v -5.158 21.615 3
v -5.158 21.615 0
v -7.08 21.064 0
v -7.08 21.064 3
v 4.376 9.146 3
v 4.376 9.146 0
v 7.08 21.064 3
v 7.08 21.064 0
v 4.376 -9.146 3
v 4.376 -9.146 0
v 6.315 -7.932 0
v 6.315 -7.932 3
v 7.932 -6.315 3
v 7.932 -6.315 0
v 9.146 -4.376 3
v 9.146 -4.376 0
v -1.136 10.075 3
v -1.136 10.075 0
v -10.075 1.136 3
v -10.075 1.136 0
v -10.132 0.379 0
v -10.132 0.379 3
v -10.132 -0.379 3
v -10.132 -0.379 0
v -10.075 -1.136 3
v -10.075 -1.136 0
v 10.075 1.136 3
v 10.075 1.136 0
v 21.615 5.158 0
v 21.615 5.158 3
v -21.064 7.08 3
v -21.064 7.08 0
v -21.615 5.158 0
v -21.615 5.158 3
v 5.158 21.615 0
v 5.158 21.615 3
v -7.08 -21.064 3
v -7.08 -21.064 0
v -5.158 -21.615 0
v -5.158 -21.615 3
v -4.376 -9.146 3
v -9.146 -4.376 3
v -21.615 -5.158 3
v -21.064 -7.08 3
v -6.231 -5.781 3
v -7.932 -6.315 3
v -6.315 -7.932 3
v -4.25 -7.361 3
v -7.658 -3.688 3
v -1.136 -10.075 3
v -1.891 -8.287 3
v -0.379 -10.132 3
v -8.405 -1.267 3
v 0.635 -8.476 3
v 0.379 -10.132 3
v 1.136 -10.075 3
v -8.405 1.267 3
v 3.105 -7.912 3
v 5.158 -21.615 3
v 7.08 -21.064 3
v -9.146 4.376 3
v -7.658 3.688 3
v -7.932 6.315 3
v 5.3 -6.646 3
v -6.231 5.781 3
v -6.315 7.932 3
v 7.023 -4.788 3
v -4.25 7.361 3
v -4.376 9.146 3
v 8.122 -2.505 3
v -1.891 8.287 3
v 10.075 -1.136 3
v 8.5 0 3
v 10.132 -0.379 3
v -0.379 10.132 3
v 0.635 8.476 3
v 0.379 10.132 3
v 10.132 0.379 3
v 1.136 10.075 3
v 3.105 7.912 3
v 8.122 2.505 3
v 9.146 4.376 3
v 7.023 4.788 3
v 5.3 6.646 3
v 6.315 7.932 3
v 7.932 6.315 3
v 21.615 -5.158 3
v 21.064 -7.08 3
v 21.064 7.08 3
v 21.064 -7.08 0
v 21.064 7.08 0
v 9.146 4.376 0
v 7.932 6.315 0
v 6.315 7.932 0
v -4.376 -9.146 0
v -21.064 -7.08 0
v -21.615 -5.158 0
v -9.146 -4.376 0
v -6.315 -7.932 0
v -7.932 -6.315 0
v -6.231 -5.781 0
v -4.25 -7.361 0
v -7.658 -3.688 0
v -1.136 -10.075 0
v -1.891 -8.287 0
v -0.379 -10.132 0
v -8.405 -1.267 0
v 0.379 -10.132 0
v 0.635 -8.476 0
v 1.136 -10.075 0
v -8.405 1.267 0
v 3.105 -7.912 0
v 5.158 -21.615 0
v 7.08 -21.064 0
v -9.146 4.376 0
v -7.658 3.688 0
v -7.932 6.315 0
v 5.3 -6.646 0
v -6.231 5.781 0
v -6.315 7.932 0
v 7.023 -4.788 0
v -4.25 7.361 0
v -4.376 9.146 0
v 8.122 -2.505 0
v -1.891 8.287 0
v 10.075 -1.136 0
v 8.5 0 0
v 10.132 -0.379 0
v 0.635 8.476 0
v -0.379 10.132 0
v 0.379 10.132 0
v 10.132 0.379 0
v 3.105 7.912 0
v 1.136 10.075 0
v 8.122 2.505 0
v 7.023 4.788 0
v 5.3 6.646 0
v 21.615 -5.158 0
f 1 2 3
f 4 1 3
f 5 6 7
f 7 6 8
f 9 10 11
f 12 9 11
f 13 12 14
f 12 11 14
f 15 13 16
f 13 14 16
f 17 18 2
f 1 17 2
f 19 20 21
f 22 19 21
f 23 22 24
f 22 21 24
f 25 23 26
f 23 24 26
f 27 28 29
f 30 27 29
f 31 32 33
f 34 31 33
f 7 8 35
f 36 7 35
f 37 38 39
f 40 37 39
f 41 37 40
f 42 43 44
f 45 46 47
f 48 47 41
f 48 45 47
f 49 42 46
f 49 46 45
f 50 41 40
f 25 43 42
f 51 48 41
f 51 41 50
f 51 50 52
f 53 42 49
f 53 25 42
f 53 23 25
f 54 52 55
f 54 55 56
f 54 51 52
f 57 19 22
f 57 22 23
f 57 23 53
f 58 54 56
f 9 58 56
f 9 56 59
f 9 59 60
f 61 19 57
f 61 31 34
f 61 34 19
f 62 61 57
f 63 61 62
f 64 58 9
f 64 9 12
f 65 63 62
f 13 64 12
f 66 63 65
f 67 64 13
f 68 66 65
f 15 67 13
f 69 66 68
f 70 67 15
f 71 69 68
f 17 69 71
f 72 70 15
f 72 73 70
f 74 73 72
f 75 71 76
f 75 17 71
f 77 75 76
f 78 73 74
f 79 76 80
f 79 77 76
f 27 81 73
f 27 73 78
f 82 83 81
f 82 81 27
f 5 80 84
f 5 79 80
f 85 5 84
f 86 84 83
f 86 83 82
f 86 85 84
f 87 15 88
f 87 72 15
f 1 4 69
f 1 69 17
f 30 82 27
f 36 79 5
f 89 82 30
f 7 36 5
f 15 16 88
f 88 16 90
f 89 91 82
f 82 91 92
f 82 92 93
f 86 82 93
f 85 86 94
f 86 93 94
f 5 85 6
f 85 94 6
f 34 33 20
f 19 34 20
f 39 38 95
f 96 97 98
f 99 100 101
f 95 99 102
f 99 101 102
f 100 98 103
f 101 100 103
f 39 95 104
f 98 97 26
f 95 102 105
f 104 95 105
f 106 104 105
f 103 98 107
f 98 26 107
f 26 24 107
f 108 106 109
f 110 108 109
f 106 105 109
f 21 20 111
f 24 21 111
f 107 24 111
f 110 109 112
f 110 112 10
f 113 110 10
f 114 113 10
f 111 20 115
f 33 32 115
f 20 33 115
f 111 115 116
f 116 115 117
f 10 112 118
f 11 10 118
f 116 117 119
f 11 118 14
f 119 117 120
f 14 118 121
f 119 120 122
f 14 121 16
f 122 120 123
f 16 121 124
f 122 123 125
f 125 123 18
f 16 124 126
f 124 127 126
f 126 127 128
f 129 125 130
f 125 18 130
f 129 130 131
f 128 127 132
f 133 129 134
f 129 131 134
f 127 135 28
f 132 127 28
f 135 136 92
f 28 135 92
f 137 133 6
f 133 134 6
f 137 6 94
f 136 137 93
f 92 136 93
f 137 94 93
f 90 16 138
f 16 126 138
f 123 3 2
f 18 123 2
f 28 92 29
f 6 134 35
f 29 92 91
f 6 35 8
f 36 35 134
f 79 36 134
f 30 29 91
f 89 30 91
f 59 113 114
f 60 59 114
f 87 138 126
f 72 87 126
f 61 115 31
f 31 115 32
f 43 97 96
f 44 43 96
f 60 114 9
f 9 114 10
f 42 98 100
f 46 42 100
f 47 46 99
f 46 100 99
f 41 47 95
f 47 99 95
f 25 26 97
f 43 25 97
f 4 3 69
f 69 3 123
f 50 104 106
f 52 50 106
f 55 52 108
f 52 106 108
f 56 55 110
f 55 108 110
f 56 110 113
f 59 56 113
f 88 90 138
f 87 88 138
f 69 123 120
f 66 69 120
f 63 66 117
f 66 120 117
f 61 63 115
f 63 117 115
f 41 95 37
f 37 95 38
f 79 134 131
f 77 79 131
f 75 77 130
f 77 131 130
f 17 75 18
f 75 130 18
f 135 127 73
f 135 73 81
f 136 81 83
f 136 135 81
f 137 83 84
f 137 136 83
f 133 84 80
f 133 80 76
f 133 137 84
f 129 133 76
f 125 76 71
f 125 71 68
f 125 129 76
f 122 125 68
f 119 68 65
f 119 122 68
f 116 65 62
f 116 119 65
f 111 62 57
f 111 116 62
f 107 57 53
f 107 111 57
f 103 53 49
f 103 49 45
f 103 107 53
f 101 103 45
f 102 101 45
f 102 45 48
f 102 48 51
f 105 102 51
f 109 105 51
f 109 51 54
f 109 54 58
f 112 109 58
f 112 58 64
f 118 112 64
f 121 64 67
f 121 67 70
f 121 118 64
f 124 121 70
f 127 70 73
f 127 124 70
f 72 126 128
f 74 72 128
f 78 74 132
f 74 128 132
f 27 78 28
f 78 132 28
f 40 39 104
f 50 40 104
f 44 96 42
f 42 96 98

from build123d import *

# Parameters (mm, degrees)
SKETCH_1_R      = 8.5
EXTRUDE_1_DEPTH = 3


with BuildPart() as part:
    # 草图1 → 凸台-拉伸1 (new body)
    with BuildSketch(Plane.XY):
        with BuildLine():
            Line((21.064196615, 7.08036062), (9.146107852, 4.376016947))
            ThreePointArc((9.146107852, 4.376016947), (7.169407686, 7.169407686), (4.376016947, 9.146107852))
            Line((4.376016947, 9.146107852), (7.08036062, 21.064196615))
            Line((7.08036062, 21.064196615), (5.157837228, 21.615471327))
            Line((5.157837228, 21.615471327), (1.135625903, 10.075275031))
            ThreePointArc((1.135625903, 10.075275031), (0, 10.139073584), (-1.135625903, 10.075275031))
            Line((-1.135625903, 10.075275031), (-5.157837228, 21.615471327))
            Line((-5.157837228, 21.615471327), (-7.08036062, 21.064196615))
            Line((-7.08036062, 21.064196615), (-4.376016947, 9.146107852))
            ThreePointArc((-4.376016947, 9.146107852), (-7.169407686, 7.169407686), (-9.146107852, 4.376016947))
            Line((-9.146107852, 4.376016947), (-21.064196615, 7.08036062))
            Line((-21.064196615, 7.08036062), (-21.615471327, 5.157837228))
            Line((-21.615471327, 5.157837228), (-10.075275031, 1.135625903))
            ThreePointArc((-10.075275031, 1.135625903), (-10.139073584, 0), (-10.075275031, -1.135625903))
            Line((-10.075275031, -1.135625903), (-21.615471327, -5.157837228))
            Line((-21.615471327, -5.157837228), (-21.064196615, -7.08036062))
            Line((-21.064196615, -7.08036062), (-9.146107852, -4.376016947))
            ThreePointArc((-9.146107852, -4.376016947), (-7.169407686, -7.169407686), (-4.376016947, -9.146107852))
            Line((-4.376016947, -9.146107852), (-7.08036062, -21.064196615))
            Line((-7.08036062, -21.064196615), (-5.157837228, -21.615471327))
            Line((-5.157837228, -21.615471327), (-1.135625903, -10.075275031))
            ThreePointArc((-1.135625903, -10.075275031), (0, -10.139073584), (1.135625903, -10.075275031))
            Line((1.135625903, -10.075275031), (5.157837228, -21.615471327))
            Line((5.157837228, -21.615471327), (7.08036062, -21.064196615))
            Line((7.08036062, -21.064196615), (4.376016947, -9.146107852))
            ThreePointArc((4.376016947, -9.146107852), (7.169407686, -7.169407686), (9.146107852, -4.376016947))
            Line((9.146107852, -4.376016947), (21.064196615, -7.08036062))
            Line((21.064196615, -7.08036062), (21.615471327, -5.157837228))
            Line((21.615471327, -5.157837228), (10.075275031, -1.135625903))
            ThreePointArc((10.075275031, -1.135625903), (10.139073584, 0), (10.075275031, 1.135625903))
            Line((10.075275031, 1.135625903), (21.615471327, 5.157837228))
            Line((21.615471327, 5.157837228), (21.064196615, 7.08036062))
        make_face()
        Circle(SKETCH_1_R, mode=Mode.SUBTRACT)
    extrude(amount=EXTRUDE_1_DEPTH)


solid = part.part
